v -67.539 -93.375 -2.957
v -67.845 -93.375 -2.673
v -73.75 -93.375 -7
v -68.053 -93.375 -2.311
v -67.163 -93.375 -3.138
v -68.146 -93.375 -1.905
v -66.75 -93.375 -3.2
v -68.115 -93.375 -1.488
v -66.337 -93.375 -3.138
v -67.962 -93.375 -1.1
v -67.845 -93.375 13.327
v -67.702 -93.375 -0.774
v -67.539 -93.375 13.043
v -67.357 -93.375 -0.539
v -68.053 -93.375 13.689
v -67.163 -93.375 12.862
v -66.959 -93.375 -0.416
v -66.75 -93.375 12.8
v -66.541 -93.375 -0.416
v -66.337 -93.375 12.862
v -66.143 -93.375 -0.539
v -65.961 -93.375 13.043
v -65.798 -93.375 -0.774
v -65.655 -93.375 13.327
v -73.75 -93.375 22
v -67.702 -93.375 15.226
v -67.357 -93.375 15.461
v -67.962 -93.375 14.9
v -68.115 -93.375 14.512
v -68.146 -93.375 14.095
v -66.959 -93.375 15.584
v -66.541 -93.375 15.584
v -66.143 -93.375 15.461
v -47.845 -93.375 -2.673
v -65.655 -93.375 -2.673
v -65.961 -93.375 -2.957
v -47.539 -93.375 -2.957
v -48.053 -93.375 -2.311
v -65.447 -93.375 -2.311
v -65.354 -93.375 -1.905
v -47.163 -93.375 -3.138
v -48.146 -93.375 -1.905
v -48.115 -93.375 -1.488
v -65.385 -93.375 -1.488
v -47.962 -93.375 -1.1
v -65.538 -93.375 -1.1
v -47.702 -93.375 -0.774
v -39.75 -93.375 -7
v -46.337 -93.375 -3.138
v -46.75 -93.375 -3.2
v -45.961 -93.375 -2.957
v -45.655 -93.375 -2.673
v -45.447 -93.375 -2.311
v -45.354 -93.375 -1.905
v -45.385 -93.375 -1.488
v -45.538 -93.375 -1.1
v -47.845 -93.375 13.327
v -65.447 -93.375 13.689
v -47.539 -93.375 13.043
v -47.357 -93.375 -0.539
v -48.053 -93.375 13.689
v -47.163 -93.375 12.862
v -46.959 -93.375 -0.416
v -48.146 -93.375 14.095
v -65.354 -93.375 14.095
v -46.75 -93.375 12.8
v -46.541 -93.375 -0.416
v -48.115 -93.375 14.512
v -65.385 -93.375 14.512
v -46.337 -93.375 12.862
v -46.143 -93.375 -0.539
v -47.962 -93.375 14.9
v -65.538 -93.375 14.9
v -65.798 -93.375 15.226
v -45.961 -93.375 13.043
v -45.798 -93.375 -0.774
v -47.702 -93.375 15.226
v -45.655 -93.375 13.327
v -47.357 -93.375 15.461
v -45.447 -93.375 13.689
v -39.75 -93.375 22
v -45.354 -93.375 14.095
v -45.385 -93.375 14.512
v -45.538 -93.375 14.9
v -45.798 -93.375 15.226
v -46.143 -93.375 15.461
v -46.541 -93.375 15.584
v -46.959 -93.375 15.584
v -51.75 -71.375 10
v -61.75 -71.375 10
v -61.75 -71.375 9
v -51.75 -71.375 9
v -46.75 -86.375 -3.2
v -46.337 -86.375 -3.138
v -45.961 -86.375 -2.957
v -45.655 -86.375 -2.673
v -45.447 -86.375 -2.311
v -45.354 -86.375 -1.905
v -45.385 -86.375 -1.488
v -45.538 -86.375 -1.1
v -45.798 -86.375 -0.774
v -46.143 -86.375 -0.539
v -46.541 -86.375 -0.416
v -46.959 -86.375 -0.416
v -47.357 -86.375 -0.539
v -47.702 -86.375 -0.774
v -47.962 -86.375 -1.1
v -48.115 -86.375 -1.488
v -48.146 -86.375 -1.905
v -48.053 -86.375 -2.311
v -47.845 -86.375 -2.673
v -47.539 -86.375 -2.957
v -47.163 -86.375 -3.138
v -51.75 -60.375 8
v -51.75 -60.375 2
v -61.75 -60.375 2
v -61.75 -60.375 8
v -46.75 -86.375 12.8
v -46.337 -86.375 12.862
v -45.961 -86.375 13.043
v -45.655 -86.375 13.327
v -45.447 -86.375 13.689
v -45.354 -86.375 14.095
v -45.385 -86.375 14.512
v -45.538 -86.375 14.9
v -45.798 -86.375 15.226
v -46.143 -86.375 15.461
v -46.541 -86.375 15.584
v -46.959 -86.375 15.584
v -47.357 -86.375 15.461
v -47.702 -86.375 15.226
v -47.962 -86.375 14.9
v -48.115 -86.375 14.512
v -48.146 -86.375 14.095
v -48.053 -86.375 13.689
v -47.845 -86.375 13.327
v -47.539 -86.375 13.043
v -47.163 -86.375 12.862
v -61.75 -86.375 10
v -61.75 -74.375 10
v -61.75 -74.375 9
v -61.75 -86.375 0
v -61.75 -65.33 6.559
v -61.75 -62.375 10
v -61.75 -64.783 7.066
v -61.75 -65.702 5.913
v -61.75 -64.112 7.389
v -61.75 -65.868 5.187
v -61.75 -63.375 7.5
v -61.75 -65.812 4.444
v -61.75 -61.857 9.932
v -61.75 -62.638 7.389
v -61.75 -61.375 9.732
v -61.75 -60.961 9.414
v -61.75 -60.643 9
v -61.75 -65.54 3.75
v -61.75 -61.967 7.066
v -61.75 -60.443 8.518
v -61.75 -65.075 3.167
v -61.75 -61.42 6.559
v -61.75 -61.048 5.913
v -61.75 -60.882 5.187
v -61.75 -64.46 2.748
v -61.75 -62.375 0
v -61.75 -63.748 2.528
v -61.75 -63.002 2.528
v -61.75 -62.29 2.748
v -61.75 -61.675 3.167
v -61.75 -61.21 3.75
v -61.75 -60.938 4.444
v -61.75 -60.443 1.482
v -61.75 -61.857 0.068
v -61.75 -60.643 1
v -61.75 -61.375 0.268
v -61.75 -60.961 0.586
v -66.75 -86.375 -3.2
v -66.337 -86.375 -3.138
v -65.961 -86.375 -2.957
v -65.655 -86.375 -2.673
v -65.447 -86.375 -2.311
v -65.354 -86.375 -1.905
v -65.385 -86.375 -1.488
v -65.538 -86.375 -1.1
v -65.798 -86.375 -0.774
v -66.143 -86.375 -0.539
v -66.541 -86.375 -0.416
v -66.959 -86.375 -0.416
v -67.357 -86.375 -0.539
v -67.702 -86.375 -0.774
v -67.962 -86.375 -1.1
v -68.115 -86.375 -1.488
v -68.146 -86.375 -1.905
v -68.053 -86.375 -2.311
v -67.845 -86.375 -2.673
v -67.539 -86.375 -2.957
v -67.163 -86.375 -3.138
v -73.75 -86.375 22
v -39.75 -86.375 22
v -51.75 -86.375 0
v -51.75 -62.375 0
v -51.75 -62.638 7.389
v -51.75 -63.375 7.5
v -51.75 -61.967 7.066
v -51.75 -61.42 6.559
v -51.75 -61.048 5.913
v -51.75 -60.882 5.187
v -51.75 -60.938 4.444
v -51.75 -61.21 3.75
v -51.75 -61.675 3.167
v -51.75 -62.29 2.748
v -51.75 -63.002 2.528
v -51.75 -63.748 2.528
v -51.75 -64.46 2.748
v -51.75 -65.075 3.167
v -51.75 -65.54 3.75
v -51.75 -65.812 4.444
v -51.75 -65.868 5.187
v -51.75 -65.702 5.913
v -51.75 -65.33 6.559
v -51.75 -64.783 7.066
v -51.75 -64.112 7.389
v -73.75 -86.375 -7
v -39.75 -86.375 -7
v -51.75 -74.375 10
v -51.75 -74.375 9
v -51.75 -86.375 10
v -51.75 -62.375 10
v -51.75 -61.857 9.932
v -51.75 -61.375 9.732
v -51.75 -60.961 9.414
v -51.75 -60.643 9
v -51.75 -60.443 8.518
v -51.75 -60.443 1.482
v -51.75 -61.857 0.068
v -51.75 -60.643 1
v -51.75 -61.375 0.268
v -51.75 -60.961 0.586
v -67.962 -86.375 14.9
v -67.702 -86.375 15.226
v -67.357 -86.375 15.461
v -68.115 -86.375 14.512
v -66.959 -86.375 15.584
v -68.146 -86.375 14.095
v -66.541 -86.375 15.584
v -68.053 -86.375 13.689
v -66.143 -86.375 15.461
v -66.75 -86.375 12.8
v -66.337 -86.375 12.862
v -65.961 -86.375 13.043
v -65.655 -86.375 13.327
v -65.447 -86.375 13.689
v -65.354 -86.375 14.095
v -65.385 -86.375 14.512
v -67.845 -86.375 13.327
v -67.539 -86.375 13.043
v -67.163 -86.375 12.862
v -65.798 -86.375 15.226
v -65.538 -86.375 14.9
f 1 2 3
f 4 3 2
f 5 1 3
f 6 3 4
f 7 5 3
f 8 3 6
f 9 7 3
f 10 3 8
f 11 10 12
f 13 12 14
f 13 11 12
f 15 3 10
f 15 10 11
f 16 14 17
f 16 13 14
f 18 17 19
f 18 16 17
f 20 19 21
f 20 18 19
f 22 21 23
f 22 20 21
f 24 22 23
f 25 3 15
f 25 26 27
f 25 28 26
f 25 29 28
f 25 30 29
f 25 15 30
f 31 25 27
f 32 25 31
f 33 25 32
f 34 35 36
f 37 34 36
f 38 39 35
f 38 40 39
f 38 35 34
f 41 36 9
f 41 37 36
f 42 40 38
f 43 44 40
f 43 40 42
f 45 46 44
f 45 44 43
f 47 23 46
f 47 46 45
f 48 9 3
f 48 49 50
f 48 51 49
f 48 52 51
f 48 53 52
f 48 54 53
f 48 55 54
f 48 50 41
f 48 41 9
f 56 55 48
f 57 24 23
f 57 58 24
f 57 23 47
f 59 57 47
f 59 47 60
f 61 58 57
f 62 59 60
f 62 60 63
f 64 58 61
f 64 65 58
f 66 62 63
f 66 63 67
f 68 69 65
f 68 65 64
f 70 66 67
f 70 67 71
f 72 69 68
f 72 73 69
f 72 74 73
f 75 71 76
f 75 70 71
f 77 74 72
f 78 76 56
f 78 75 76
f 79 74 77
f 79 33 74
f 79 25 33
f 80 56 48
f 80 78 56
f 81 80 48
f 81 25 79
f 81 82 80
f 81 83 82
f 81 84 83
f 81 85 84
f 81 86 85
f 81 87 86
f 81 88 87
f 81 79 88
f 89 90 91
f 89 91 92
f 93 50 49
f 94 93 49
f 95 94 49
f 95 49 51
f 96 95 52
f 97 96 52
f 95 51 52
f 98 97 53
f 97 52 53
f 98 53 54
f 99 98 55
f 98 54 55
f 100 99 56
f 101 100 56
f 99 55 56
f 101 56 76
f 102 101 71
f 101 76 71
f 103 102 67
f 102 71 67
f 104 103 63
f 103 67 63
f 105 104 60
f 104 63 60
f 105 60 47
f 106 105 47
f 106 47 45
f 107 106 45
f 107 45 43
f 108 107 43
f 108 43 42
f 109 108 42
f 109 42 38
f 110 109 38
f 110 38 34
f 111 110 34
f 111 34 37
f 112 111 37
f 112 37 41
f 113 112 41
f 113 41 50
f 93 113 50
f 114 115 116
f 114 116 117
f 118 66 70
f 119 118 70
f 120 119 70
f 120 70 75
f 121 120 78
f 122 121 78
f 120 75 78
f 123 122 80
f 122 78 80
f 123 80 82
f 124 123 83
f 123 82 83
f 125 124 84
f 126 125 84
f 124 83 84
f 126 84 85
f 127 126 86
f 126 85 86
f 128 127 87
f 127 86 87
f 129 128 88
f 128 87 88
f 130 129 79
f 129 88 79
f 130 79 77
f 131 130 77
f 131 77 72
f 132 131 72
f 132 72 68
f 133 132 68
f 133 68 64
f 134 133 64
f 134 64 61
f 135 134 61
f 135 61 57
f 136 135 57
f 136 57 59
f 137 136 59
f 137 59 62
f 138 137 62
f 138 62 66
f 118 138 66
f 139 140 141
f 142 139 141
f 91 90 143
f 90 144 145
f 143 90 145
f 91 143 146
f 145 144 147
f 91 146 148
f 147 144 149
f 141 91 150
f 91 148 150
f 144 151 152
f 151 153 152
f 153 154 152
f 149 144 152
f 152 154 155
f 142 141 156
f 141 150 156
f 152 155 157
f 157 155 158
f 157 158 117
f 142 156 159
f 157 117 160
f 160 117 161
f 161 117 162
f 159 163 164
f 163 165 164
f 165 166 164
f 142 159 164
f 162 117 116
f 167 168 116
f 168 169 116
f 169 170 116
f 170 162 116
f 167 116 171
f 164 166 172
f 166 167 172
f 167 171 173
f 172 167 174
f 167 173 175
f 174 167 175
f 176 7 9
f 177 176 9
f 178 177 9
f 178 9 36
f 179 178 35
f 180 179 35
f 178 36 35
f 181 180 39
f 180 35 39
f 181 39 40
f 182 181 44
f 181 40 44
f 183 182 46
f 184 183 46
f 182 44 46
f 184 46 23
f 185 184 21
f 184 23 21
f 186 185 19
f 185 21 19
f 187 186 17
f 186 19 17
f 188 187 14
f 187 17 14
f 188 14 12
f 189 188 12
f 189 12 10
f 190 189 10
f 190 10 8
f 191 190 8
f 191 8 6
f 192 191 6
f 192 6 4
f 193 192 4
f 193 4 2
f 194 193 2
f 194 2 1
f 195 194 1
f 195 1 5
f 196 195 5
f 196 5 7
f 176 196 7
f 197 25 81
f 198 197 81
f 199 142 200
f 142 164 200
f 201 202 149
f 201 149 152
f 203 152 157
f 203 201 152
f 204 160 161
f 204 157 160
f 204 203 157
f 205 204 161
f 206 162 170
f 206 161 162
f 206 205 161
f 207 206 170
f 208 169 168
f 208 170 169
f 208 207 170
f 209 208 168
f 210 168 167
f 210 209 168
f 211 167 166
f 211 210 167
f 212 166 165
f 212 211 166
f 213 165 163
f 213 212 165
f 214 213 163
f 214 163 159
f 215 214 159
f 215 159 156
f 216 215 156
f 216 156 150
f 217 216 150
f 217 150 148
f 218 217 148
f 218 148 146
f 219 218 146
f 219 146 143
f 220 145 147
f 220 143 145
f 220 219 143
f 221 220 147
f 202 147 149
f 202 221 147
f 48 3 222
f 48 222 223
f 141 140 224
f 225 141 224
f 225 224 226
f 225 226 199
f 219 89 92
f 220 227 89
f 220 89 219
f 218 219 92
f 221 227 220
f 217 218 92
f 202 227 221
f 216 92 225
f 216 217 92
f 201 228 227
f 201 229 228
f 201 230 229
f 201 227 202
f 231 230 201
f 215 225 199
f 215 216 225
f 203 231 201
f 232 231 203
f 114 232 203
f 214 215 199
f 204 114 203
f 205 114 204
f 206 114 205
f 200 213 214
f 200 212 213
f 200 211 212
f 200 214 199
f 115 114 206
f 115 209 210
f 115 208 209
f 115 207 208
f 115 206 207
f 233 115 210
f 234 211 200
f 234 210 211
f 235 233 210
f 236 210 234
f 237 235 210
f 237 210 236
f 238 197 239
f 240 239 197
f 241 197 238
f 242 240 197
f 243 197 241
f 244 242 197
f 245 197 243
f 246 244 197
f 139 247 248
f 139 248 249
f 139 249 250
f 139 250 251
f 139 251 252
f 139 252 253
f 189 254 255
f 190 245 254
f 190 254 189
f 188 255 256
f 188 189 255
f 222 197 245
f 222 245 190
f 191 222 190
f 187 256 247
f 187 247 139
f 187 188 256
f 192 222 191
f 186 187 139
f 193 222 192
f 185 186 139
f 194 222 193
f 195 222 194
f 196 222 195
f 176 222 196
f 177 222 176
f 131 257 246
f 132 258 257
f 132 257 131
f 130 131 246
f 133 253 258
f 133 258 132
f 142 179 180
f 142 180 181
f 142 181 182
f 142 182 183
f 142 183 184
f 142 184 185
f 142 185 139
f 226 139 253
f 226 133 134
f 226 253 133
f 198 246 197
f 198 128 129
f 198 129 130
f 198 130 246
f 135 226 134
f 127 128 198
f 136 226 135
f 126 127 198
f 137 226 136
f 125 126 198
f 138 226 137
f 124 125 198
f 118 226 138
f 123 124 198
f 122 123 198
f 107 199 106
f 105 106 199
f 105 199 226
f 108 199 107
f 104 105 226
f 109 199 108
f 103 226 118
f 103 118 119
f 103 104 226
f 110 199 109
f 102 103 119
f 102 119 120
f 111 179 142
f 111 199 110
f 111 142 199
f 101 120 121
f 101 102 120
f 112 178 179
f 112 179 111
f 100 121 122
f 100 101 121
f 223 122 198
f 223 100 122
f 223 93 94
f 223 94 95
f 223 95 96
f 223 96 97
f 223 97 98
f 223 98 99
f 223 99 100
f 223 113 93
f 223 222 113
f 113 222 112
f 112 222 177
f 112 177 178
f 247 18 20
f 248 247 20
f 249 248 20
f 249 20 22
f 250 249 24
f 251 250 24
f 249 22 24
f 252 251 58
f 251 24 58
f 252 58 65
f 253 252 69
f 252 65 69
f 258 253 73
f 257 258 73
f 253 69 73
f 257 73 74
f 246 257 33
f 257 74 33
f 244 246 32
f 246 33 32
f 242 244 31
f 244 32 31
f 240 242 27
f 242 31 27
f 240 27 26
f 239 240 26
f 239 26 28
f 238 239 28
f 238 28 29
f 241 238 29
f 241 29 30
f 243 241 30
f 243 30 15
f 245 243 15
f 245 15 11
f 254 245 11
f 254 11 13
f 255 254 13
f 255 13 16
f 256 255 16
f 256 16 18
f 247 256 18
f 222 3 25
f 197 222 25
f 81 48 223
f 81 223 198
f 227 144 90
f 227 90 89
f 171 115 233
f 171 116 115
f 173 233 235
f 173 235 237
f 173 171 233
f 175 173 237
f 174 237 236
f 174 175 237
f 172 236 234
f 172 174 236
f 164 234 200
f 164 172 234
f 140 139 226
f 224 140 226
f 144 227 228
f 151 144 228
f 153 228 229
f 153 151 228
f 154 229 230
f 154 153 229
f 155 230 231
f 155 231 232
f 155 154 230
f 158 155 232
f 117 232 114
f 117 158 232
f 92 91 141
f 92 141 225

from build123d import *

# Parameters (mm, degrees)
SKETCH2_W               = 147.5
SKETCH2_H               = 176.75
BOSS_EXTRUDE1_DEPTH     = 10
SKETCH3_W               = 29
SKETCH3_H               = 15
BOSS_EXTRUDE2_DEPTH     = 34
BOSS_EXTRUDE3_DEPTH     = 34
SKETCH8_W               = 113.5
SKETCH8_H               = 176.75
CUT_EXTRUDE1_DEPTH      = 30
SKETCH9_R               = 2.5
CUT_EXTRUDE2_DEPTH      = 134.016415209
SKETCH10_W              = 3
SKETCH10_H              = 3
CUT_EXTRUDE3_DEPTH      = 3
CUT_EXTRUDE4_DEPTH      = 134.016415209
CUT_EXTRUDE4_DEPTH_BACK = 134.016415209
SKETCH11_W              = 9
SKETCH11_H              = 8
SKETCH11_H_2            = 4
SKETCH11_W_2            = 3
SKETCH11_R              = 2.5
SKETCH11_W_3            = 34
SKETCH11_H_3            = 15
CUT_EXTRUDE5_DEPTH      = 94.691731892
CUT_EXTRUDE5_DEPTH_BACK = 94.691731892
SKETCH13_R              = 2.5
CUT_EXTRUDE6_DEPTH      = 94.691731892
CUT_EXTRUDE6_DEPTH_BACK = 94.691731892
SKETCH14_W              = 10
SKETCH14_H              = 2
FILLET1_R               = 2
SKETCH15_R              = 1.4
CUT_EXTRUDE7_DEPTH      = 34
SKETCH18_W              = 12
SKETCH18_H              = 8
CUT_EXTRUDE8_DEPTH      = 34
SKETCH19_W              = 7
SKETCH19_H              = 8
SKETCH19_W_2            = 12
CUT_EXTRUDE9_DEPTH      = 34
BOSS_EXTRUDE4_START     = 5
SKETCH20_W              = 34
SKETCH20_H              = 29
SKETCH20_R              = 1.4
BOSS_EXTRUDE4_DEPTH     = 5
SKETCH21_W              = 34
SKETCH21_H              = 29
SKETCH21_W_2            = 10
SKETCH21_H_2            = 10
CUT_EXTRUDE10_DEPTH     = 5
SKETCH22_W              = 10
SKETCH22_H              = 3
CUT_EXTRUDE11_DEPTH     = 1


with BuildPart() as part:
    # Sketch2 → Boss-Extrude1 (new body)
    with BuildSketch(Plane.XY):
        Rectangle(SKETCH2_W, SKETCH2_H)
    extrude(amount=BOSS_EXTRUDE1_DEPTH)

    # Sketch3 → Boss-Extrude2 (add)
    with BuildSketch(Plane.ZY.offset(73.75)):
        with Locations((7.5, 80.875)):
            Rectangle(SKETCH3_W, SKETCH3_H)
        with Locations((7.5, -80.875)):
            Rectangle(SKETCH3_W, SKETCH3_H)
    boss_extrude2 = extrude(amount=-BOSS_EXTRUDE2_DEPTH)

    # Mirror1: Boss-Extrude2 across plane
    add(boss_extrude2.mirror(Plane(origin=(0, 0, 0), x_dir=(0, 0, 1), z_dir=(1, 0, 0))))

    # Sketch5 → Boss-Extrude3 (add)
    with BuildSketch(Plane.ZY.offset(73.75)):
        Polygon((13.717233978, 0), (47.494362324, 23.650999887), (54.37727956, 13.821175356), (66.664560225, 22.424821901), (50.030843571, 46.180231185), (37.743562906, 37.57658464), (41.758597961, 31.84252033), (10, 9.604910635), (10, -9.604910635), (41.758597961, -31.84252033), (37.743562906, -37.57658464), (50.030843571, -46.180231185), (66.664560225, -22.424821901), (54.37727956, -13.821175356), (47.494362324, -23.650999887), align=None)
    extrude(amount=-BOSS_EXTRUDE3_DEPTH)

    # Sketch8 → Cut-Extrude1 (cut)
    with BuildSketch(Plane.XY.offset(22)):
        with Locations((17, 0)):
            Rectangle(SKETCH8_W, SKETCH8_H)
    extrude(amount=-CUT_EXTRUDE1_DEPTH, mode=Mode.SUBTRACT)

    # Sketch9 → Cut-Extrude2 (cut, through all)
    with BuildSketch(Plane(origin=(0, 0, 0), x_dir=(-1, 0, 0), z_dir=(0, 0, -1))):
        with Locations((49.75, 58.375)):
            Circle(SKETCH9_R)
        with Locations((63.75, 58.375)):
            Circle(SKETCH9_R)
        with Locations((49.75, -53.375)):
            Circle(SKETCH9_R)
        with Locations((63.75, -53.375)):
            Circle(SKETCH9_R)
    extrude(amount=-CUT_EXTRUDE2_DEPTH, mode=Mode.SUBTRACT)

    # Sketch10 → Cut-Extrude3 (cut)
    with BuildSketch(Plane(origin=(0, 0, -7), x_dir=(-1, 0, 0), z_dir=(0, 0, -1))):
        with Locations((72.25, 86.875)):
            Rectangle(SKETCH10_W, SKETCH10_H)
    extrude(amount=-CUT_EXTRUDE3_DEPTH, mode=Mode.SUBTRACT)

    # Sketch11 → Cut-Extrude4 (cut, two sides: drawn at the far end of the back side and taken through both)
    # profile 1 of 12: a face of its own
    with BuildSketch(Plane(origin=(0, 0, 0), x_dir=(-1, 0, 0), z_dir=(0, 0, -1)).offset(-CUT_EXTRUDE4_DEPTH_BACK)):
        with Locations((47.25, -69.375)):
            Rectangle(SKETCH11_W, SKETCH11_H)
    # profile 2 of 12: a face of its own
    with BuildSketch(Plane(origin=(0, 0, 0), x_dir=(-1, 0, 0), z_dir=(0, 0, -1)).offset(-CUT_EXTRUDE4_DEPTH_BACK)):
        with Locations((47.25, -63.375)):
            Rectangle(SKETCH11_W, SKETCH11_H_2)
    # profile 3 of 12: a face of its own
    with BuildSketch(Plane(origin=(0, 0, 0), x_dir=(-1, 0, 0), z_dir=(0, 0, -1)).offset(-CUT_EXTRUDE4_DEPTH_BACK)):
        with Locations((41.25, -69.375)):
            Rectangle(SKETCH11_W_2, SKETCH11_H)
    # profile 4 of 12: a face of its own
    with BuildSketch(Plane(origin=(0, 0, 0), x_dir=(-1, 0, 0), z_dir=(0, 0, -1)).offset(-CUT_EXTRUDE4_DEPTH_BACK)):
        with Locations((41.25, -63.375)):
            Rectangle(SKETCH11_W_2, SKETCH11_H_2)
    # profile 5 of 12: a face of its own
    with BuildSketch(Plane(origin=(0, 0, 0), x_dir=(-1, 0, 0), z_dir=(0, 0, -1)).offset(-CUT_EXTRUDE4_DEPTH_BACK)):
        with Locations((66.25, -69.375)):
            Rectangle(SKETCH11_W, SKETCH11_H)
    # profile 6 of 12: a face of its own
    with BuildSketch(Plane(origin=(0, 0, 0), x_dir=(-1, 0, 0), z_dir=(0, 0, -1)).offset(-CUT_EXTRUDE4_DEPTH_BACK)):
        with Locations((66.25, -63.375)):
            Rectangle(SKETCH11_W, SKETCH11_H_2)
    # profile 7 of 12: a face of its own
    with BuildSketch(Plane(origin=(0, 0, 0), x_dir=(-1, 0, 0), z_dir=(0, 0, -1)).offset(-CUT_EXTRUDE4_DEPTH_BACK)):
        with Locations((72.25, -63.375)):
            Rectangle(SKETCH11_W_2, SKETCH11_H_2)
    # profile 8 of 12: a face of its own
    with BuildSketch(Plane(origin=(0, 0, 0), x_dir=(-1, 0, 0), z_dir=(0, 0, -1)).offset(-CUT_EXTRUDE4_DEPTH_BACK)):
        with Locations((72.25, -69.375)):
            Rectangle(SKETCH11_W_2, SKETCH11_H)
    # profile 9 of 12: a face of its own
    with BuildSketch(Plane(origin=(0, 0, 0), x_dir=(-1, 0, 0), z_dir=(0, 0, -1)).offset(-CUT_EXTRUDE4_DEPTH_BACK)):
        Polygon((39.75, 73.375), (39.75, -58.375), (51.75, -58.375), (61.75, -58.375), (73.75, -58.375), (73.75, 73.375), align=None)
        with Locations((49.75, -53.375)):
            Circle(SKETCH11_R, mode=Mode.SUBTRACT)
        with Locations((63.75, -53.375)):
            Circle(SKETCH11_R, mode=Mode.SUBTRACT)
        with Locations((49.75, 58.375)):
            Circle(SKETCH11_R, mode=Mode.SUBTRACT)
        with Locations((63.75, 58.375)):
            Circle(SKETCH11_R, mode=Mode.SUBTRACT)
    # profile 10 of 12: a face of its own
    with BuildSketch(Plane(origin=(0, 0, 0), x_dir=(-1, 0, 0), z_dir=(0, 0, -1)).offset(-CUT_EXTRUDE4_DEPTH_BACK)):
        Polygon((61.75, -58.375), (61.75, -61.375), (70.75, -61.375), (73.75, -61.375), (73.75, -58.375), align=None)
    # profile 11 of 12: a face of its own
    with BuildSketch(Plane(origin=(0, 0, 0), x_dir=(-1, 0, 0), z_dir=(0, 0, -1)).offset(-CUT_EXTRUDE4_DEPTH_BACK)):
        Polygon((39.75, -58.375), (39.75, -61.375), (42.75, -61.375), (51.75, -61.375), (51.75, -58.375), align=None)
    # profile 12 of 12: a face of its own
    with BuildSketch(Plane(origin=(0, 0, 0), x_dir=(-1, 0, 0), z_dir=(0, 0, -1)).offset(-CUT_EXTRUDE4_DEPTH_BACK)):
        with Locations((56.75, 80.875)):
            Rectangle(SKETCH11_W_3, SKETCH11_H_3)
    extrude(amount=CUT_EXTRUDE4_DEPTH + CUT_EXTRUDE4_DEPTH_BACK, mode=Mode.SUBTRACT)

    # Sketch13 → Cut-Extrude5 (cut, two sides: drawn at the far end of the back side and taken through both)
    with BuildSketch(Plane.ZY.offset(61.75).offset(-CUT_EXTRUDE5_DEPTH_BACK)):
        with Locations((5, -63.375)):
            Circle(SKETCH13_R)
    extrude(amount=CUT_EXTRUDE5_DEPTH + CUT_EXTRUDE5_DEPTH_BACK, mode=Mode.SUBTRACT)

    # Sketch14 → Cut-Extrude6 (cut, two sides: drawn at the far end of the back side and taken through both)
    with BuildSketch(Plane.ZY.offset(61.75).offset(-CUT_EXTRUDE6_DEPTH_BACK)):
        with Locations((5, -59.375)):
            Rectangle(SKETCH14_W, SKETCH14_H)
    extrude(amount=CUT_EXTRUDE6_DEPTH + CUT_EXTRUDE6_DEPTH_BACK, mode=Mode.SUBTRACT)

    # Fillet1
    fillet1_edges = [part.edges().sort_by_distance(p)[0] for p in [
        (-56.75, -60.375, 0),
        (-56.75, -60.375, 10),
    ]]
    fillet(fillet1_edges, radius=FILLET1_R)

    # Sketch15 → Cut-Extrude7 (cut)
    with BuildSketch(Plane.XZ.offset(88.375)):
        with Locations(Location((-46.75, -1.8, 0), (0, 0, 270))):
            Circle(SKETCH15_R)
        with Locations(Location((-66.75, -1.8, 0), (0, 0, 270))):
            Circle(SKETCH15_R)
        with Locations(Location((-66.75, 14.2, 0), (0, 0, 270))):
            Circle(SKETCH15_R)
        with Locations(Location((-46.75, 14.2, 0), (0, 0, 270))):
            Circle(SKETCH15_R)
    extrude(amount=-CUT_EXTRUDE7_DEPTH, mode=Mode.SUBTRACT)

    # Sketch18 → Cut-Extrude8 (cut)
    with BuildSketch(Plane(origin=(0, 0, -7), x_dir=(-1, 0, 0), z_dir=(0, 0, -1))):
        with Locations((45.75, -77.375)):
            Rectangle(SKETCH18_W, SKETCH18_H)
        with Locations((67.75, -77.375)):
            Rectangle(SKETCH18_W, SKETCH18_H)
    extrude(amount=-CUT_EXTRUDE8_DEPTH, mode=Mode.SUBTRACT)

    # Sketch19 → Cut-Extrude9 (cut)
    with BuildSketch(Plane.ZY.offset(61.75)):
        with Locations((-3.5, -77.375)):
            Rectangle(SKETCH19_W, SKETCH19_H)
        with Locations((16, -77.375)):
            Rectangle(SKETCH19_W_2, SKETCH19_H)
    extrude(amount=-CUT_EXTRUDE9_DEPTH, mode=Mode.SUBTRACT)

    # Sketch20 → Boss-Extrude4 (add)
    with BuildSketch(Plane.XZ.offset(88.375).offset(BOSS_EXTRUDE4_START)):
        with Locations((-56.75, 7.5)):
            Rectangle(SKETCH20_W, SKETCH20_H)
        with Locations(Location((-66.75, 14.2, 0), (0, 0, 270))):
            Circle(SKETCH20_R, mode=Mode.SUBTRACT)
        with Locations(Location((-46.75, 14.2, 0), (0, 0, 270))):
            Circle(SKETCH20_R, mode=Mode.SUBTRACT)
        with Locations(Location((-46.75, -1.8, 0), (0, 0, 270))):
            Circle(SKETCH20_R, mode=Mode.SUBTRACT)
        with Locations(Location((-66.75, -1.8, 0), (0, 0, 270))):
            Circle(SKETCH20_R, mode=Mode.SUBTRACT)
    extrude(amount=-BOSS_EXTRUDE4_DEPTH)

    # Sketch21 → Cut-Extrude10 (cut)
    with BuildSketch(Plane(origin=(0, -81.375, 0), x_dir=(1, 0, 0), z_dir=(0, 1, 0))):
        with Locations((-56.75, -7.5)):
            Rectangle(SKETCH21_W, SKETCH21_H)
        with Locations((-56.75, -5)):
            Rectangle(SKETCH21_W_2, SKETCH21_H_2, mode=Mode.SUBTRACT)
    extrude(amount=-CUT_EXTRUDE10_DEPTH, mode=Mode.SUBTRACT)

    # Sketch22 → Cut-Extrude11 (cut)
    with BuildSketch(Plane.XY.offset(10)):
        with Locations((-56.75, -72.875)):
            Rectangle(SKETCH22_W, SKETCH22_H)
    extrude(amount=-CUT_EXTRUDE11_DEPTH, mode=Mode.SUBTRACT)


solid = part.part
